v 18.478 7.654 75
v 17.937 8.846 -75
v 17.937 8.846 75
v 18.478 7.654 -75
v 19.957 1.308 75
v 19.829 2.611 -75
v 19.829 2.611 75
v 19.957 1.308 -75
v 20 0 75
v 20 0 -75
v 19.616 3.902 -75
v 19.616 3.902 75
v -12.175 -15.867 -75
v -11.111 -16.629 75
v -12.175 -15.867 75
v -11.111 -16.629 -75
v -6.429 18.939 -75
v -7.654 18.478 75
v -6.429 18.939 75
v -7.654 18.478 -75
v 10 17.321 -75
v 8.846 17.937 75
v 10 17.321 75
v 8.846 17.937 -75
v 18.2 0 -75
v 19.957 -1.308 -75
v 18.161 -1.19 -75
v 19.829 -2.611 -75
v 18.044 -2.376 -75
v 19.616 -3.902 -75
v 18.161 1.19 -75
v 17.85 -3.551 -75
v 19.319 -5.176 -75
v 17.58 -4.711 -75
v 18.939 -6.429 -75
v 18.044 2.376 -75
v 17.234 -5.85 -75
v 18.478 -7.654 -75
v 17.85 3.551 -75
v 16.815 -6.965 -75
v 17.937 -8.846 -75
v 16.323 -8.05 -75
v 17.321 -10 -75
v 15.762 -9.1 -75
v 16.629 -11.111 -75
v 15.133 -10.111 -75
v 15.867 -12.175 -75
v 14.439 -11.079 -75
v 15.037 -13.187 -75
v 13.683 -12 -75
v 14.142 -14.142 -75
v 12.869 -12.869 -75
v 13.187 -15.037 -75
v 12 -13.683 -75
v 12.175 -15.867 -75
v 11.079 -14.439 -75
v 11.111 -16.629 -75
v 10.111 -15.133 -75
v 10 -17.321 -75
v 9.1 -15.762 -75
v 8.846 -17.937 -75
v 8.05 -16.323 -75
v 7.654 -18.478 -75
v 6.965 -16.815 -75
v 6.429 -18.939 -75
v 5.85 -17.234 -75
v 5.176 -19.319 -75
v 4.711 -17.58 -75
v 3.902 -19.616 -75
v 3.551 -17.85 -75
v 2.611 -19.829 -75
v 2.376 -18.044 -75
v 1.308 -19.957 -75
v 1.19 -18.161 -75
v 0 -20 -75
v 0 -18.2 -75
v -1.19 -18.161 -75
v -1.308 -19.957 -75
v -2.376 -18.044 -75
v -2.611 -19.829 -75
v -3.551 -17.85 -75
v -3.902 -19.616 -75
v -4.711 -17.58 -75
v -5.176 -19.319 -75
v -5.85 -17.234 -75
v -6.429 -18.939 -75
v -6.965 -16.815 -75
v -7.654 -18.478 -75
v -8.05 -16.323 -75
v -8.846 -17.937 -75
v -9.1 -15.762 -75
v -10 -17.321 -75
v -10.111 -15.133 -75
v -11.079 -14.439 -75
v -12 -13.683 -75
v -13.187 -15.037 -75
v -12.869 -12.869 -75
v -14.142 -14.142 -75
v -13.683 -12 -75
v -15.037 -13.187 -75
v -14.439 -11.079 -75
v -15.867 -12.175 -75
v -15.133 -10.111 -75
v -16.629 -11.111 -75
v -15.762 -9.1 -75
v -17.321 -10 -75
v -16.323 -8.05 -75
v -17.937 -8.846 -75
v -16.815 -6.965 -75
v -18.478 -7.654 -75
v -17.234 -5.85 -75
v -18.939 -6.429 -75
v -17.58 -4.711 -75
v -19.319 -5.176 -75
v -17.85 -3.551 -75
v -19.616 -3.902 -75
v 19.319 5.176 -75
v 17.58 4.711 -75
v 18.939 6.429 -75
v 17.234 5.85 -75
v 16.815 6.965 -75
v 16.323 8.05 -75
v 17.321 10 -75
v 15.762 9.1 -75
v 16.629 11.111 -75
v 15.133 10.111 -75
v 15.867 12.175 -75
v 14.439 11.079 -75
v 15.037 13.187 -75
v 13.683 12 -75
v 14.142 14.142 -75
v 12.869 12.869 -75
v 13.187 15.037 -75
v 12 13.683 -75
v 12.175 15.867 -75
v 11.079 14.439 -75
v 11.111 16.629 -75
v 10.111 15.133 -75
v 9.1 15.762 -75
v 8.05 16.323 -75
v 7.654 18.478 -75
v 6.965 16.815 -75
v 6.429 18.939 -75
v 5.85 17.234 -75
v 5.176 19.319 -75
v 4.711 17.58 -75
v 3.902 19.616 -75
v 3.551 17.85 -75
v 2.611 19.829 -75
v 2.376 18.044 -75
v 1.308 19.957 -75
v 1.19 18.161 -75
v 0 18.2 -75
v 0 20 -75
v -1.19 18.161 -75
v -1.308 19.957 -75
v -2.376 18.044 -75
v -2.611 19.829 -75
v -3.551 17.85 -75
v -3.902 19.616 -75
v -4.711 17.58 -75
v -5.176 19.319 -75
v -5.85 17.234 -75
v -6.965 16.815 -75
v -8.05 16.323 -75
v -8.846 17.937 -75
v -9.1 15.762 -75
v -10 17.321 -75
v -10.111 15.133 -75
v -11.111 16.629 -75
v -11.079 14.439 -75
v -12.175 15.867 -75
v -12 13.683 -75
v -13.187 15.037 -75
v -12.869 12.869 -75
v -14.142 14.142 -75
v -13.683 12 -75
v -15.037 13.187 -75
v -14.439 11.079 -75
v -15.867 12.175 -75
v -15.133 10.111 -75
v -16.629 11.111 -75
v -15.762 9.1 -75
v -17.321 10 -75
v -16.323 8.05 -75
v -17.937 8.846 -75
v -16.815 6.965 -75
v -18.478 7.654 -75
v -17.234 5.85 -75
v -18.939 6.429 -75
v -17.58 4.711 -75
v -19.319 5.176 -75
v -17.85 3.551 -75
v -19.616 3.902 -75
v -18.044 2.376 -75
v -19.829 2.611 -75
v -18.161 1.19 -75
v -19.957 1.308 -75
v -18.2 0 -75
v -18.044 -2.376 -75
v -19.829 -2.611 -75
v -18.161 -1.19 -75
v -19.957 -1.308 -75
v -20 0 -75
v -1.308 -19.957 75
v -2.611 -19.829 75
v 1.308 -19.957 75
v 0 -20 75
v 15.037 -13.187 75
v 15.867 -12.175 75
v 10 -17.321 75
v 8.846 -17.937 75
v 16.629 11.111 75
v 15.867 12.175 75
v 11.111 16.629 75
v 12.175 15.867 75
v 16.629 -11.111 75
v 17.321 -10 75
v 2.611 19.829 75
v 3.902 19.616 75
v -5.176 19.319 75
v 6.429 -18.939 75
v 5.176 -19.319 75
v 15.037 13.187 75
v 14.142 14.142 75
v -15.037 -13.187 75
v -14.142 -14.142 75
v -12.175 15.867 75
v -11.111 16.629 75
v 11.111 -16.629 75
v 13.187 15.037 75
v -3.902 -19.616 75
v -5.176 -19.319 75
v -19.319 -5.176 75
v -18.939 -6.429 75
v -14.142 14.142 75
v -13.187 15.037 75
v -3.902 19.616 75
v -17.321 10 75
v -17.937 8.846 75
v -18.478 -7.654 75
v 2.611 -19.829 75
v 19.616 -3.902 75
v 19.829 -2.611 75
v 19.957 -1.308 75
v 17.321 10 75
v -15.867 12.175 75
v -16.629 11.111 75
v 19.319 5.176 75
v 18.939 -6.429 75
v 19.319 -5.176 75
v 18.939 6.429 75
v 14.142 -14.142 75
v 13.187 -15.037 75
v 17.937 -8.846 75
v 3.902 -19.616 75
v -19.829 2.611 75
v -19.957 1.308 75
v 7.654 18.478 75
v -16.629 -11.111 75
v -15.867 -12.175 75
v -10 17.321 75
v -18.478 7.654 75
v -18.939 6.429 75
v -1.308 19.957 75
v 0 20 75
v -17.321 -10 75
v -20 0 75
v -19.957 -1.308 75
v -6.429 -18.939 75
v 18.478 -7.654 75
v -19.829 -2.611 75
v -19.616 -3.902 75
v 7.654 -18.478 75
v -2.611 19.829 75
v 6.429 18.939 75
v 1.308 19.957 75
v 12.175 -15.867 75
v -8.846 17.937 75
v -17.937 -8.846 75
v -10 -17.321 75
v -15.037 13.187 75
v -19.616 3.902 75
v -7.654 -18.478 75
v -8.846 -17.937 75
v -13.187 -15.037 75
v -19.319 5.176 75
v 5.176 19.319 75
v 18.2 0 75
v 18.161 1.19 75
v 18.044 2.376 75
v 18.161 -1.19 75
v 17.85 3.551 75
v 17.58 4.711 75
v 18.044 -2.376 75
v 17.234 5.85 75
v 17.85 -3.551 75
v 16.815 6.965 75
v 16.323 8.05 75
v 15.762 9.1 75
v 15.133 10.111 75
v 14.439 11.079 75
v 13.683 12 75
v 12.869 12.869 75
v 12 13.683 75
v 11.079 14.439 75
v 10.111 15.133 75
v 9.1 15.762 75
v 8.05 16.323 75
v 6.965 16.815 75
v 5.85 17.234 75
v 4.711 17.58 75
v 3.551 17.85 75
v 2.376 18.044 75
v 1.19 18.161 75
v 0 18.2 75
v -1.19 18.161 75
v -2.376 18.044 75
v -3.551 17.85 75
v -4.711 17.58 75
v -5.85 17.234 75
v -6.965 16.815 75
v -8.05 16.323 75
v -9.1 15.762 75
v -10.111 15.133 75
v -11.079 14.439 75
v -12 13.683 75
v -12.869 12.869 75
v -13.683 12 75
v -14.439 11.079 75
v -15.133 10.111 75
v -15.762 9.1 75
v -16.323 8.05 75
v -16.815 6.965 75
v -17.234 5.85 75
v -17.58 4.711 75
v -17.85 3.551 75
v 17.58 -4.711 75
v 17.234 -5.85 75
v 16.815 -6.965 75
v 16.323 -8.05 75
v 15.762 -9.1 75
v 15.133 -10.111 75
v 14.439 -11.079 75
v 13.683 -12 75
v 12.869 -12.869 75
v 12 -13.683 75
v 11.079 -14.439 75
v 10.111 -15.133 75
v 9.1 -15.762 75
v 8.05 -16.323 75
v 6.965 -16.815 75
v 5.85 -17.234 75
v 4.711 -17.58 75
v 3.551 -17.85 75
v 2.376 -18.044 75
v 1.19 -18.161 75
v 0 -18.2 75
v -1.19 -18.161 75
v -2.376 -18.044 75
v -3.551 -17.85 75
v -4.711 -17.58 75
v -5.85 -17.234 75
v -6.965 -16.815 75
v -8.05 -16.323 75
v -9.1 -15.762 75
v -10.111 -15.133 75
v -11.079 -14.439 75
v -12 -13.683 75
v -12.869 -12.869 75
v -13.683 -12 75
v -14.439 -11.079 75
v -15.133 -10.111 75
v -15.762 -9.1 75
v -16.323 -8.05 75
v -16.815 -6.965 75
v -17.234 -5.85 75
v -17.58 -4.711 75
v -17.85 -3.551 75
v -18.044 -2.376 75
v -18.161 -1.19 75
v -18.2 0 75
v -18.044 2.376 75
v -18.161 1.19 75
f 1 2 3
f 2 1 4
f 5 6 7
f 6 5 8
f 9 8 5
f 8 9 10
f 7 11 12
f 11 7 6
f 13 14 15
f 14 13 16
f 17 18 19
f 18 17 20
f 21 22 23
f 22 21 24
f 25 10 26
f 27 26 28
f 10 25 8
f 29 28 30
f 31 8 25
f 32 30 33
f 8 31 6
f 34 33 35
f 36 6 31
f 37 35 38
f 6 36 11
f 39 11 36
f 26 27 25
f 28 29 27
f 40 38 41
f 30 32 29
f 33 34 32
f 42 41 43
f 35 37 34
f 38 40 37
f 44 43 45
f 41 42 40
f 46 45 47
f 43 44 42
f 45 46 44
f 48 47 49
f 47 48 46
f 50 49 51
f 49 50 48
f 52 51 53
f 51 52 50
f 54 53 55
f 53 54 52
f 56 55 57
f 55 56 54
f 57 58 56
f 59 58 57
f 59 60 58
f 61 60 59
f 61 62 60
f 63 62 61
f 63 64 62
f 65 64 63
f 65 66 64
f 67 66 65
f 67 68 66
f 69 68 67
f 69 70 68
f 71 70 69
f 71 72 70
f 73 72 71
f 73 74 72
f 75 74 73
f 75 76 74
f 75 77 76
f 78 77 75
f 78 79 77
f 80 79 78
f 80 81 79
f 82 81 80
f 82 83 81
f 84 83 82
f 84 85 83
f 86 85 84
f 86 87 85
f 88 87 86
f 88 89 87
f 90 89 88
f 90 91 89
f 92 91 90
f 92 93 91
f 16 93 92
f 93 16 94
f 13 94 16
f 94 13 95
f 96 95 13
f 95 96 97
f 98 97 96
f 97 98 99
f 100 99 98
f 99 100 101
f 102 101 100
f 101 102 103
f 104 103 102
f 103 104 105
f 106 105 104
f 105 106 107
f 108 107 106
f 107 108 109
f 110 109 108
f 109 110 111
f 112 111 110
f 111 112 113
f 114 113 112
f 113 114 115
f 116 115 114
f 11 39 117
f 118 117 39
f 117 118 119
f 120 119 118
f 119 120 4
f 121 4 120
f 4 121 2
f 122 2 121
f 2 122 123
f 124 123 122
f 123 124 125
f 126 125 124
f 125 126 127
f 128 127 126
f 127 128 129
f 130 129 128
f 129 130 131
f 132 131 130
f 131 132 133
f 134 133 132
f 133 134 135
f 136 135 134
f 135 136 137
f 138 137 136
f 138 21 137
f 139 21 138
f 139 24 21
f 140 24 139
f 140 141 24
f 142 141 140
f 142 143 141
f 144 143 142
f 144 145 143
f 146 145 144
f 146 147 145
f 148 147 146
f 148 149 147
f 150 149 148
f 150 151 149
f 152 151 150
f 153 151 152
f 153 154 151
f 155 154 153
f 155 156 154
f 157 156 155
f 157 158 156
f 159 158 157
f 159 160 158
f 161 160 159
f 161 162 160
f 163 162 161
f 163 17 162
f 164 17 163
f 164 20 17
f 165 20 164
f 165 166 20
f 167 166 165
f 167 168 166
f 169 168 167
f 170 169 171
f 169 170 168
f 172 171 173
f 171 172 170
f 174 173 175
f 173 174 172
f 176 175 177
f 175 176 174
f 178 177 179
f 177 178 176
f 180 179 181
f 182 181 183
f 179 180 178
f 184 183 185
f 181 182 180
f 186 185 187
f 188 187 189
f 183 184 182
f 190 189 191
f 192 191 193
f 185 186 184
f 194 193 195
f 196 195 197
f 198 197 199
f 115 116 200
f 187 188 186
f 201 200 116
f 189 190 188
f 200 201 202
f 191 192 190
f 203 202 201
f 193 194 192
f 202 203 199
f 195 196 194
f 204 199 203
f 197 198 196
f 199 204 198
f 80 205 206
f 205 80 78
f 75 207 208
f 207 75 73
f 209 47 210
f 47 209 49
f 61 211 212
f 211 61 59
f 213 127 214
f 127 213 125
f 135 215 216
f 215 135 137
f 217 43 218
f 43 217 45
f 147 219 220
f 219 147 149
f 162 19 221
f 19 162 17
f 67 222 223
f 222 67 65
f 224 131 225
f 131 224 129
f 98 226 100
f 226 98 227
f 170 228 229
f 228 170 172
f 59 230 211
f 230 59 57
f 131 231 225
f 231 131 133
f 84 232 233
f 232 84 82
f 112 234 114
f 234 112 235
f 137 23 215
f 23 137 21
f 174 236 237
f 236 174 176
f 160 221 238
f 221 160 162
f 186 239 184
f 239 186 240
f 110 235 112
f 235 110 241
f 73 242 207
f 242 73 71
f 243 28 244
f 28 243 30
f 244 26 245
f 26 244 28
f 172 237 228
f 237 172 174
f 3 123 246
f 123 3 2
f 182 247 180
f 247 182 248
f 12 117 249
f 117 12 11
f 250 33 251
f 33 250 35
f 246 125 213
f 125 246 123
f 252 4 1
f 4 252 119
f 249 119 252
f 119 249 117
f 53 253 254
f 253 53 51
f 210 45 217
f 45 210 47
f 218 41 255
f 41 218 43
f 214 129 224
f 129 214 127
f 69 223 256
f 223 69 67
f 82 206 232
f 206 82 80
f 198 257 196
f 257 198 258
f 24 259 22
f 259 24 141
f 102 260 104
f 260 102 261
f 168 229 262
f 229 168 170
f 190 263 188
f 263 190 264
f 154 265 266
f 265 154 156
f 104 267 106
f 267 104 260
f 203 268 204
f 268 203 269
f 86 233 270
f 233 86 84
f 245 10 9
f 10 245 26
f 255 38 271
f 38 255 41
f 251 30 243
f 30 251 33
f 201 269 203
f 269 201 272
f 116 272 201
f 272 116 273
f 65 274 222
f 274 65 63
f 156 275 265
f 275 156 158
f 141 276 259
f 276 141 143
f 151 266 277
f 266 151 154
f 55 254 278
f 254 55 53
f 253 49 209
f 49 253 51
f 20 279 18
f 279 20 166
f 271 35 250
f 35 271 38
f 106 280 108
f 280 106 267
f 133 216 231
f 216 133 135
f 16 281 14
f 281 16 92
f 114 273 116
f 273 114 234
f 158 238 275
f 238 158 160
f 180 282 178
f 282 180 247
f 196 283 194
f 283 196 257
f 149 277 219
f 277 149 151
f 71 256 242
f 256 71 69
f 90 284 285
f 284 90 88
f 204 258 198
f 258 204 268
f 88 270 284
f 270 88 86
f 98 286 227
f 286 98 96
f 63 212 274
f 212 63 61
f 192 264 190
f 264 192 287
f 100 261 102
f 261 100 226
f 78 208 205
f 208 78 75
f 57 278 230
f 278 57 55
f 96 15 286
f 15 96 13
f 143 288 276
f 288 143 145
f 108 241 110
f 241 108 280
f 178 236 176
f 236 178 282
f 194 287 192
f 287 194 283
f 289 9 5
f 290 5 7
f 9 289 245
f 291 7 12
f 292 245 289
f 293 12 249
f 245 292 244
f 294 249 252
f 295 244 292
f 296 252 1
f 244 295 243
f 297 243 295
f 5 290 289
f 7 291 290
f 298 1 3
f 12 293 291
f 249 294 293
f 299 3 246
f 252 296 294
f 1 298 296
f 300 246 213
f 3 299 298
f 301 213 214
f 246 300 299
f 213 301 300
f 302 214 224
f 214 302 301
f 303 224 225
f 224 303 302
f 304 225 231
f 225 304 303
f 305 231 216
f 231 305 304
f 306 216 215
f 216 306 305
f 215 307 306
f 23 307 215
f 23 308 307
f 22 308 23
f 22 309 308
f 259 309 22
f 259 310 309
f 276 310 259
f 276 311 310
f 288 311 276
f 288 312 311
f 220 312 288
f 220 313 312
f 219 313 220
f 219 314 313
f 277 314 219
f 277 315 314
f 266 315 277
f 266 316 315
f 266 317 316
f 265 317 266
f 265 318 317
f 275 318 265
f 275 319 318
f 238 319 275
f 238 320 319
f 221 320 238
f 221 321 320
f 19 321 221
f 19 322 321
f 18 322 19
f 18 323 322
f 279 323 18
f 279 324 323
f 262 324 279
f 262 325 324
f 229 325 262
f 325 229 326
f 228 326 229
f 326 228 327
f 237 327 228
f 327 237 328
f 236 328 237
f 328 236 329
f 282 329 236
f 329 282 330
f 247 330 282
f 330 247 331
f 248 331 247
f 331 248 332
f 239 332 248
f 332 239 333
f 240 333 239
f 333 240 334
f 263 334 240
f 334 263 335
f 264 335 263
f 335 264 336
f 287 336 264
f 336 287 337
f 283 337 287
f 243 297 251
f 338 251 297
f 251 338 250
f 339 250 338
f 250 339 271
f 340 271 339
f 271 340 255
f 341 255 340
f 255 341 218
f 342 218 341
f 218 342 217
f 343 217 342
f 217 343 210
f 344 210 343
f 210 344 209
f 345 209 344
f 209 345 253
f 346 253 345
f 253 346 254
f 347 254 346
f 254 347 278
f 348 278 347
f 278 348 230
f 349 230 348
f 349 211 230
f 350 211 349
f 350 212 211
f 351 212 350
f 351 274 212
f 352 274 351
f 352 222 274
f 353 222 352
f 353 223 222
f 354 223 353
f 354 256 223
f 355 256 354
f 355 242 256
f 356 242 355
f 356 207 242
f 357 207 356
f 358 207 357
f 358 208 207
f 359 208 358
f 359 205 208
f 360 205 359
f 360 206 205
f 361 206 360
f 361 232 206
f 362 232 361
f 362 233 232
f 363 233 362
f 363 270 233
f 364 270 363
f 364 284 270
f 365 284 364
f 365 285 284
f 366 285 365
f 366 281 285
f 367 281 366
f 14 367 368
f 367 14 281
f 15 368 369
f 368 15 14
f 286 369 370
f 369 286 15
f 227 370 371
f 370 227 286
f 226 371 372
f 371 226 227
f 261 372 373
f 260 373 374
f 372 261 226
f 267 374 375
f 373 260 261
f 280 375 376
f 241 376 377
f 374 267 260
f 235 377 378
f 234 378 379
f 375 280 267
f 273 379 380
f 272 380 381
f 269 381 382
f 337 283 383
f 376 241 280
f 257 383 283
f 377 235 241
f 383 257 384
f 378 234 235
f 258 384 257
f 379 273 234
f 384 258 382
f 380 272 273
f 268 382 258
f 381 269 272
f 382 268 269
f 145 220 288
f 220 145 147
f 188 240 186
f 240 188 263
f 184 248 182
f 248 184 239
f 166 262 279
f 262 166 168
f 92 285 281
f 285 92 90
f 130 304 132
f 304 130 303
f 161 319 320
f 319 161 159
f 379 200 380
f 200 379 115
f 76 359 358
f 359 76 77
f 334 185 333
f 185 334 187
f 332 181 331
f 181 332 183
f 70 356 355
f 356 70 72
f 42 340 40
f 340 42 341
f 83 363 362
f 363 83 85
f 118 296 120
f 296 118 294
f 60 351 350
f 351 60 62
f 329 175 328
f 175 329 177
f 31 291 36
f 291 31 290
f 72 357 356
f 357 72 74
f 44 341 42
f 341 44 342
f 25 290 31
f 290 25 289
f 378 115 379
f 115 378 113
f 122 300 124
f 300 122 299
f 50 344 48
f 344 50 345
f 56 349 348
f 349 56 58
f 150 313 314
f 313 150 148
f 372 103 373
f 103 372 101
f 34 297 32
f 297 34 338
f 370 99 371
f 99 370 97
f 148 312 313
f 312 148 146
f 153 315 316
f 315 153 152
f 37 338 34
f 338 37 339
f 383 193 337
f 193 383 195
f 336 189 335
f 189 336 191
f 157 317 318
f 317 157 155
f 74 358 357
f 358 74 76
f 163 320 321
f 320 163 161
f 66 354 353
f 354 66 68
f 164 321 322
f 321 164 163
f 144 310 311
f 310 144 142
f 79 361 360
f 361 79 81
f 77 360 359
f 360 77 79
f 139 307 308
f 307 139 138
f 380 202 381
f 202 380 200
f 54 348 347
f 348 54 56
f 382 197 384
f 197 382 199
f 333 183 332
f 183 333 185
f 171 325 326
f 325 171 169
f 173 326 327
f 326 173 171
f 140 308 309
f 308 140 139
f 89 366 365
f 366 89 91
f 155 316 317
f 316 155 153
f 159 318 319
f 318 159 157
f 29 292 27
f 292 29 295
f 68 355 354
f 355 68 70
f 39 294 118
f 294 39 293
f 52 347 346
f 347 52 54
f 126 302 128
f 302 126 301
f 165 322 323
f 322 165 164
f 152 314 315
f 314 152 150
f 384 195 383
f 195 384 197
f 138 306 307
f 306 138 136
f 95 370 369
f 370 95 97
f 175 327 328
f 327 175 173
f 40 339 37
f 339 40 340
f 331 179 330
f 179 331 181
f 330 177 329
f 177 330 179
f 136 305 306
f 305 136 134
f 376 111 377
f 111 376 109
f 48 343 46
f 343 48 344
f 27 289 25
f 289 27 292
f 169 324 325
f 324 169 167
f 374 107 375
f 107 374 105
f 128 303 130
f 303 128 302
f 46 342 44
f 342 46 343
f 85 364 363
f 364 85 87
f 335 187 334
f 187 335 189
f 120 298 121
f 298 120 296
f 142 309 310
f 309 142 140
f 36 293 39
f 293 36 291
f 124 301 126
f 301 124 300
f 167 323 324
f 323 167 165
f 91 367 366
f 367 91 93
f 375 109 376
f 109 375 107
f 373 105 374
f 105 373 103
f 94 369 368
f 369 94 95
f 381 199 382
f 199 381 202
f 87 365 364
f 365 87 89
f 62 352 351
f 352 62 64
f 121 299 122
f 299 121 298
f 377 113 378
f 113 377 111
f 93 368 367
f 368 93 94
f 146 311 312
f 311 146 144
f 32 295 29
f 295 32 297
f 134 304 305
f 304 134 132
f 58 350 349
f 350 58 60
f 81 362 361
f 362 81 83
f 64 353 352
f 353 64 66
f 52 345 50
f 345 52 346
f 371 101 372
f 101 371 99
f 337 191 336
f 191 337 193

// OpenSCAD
$fn=96;

module ht_pipe(od=40, length=150, wall=1.8) {
    difference() {
        cylinder(h=length, d=od, center=true);
        cylinder(h=length+0.2, d=od-2*wall, center=true);
    }
}

ht_pipe(od=40, length=150, wall=1.8);
